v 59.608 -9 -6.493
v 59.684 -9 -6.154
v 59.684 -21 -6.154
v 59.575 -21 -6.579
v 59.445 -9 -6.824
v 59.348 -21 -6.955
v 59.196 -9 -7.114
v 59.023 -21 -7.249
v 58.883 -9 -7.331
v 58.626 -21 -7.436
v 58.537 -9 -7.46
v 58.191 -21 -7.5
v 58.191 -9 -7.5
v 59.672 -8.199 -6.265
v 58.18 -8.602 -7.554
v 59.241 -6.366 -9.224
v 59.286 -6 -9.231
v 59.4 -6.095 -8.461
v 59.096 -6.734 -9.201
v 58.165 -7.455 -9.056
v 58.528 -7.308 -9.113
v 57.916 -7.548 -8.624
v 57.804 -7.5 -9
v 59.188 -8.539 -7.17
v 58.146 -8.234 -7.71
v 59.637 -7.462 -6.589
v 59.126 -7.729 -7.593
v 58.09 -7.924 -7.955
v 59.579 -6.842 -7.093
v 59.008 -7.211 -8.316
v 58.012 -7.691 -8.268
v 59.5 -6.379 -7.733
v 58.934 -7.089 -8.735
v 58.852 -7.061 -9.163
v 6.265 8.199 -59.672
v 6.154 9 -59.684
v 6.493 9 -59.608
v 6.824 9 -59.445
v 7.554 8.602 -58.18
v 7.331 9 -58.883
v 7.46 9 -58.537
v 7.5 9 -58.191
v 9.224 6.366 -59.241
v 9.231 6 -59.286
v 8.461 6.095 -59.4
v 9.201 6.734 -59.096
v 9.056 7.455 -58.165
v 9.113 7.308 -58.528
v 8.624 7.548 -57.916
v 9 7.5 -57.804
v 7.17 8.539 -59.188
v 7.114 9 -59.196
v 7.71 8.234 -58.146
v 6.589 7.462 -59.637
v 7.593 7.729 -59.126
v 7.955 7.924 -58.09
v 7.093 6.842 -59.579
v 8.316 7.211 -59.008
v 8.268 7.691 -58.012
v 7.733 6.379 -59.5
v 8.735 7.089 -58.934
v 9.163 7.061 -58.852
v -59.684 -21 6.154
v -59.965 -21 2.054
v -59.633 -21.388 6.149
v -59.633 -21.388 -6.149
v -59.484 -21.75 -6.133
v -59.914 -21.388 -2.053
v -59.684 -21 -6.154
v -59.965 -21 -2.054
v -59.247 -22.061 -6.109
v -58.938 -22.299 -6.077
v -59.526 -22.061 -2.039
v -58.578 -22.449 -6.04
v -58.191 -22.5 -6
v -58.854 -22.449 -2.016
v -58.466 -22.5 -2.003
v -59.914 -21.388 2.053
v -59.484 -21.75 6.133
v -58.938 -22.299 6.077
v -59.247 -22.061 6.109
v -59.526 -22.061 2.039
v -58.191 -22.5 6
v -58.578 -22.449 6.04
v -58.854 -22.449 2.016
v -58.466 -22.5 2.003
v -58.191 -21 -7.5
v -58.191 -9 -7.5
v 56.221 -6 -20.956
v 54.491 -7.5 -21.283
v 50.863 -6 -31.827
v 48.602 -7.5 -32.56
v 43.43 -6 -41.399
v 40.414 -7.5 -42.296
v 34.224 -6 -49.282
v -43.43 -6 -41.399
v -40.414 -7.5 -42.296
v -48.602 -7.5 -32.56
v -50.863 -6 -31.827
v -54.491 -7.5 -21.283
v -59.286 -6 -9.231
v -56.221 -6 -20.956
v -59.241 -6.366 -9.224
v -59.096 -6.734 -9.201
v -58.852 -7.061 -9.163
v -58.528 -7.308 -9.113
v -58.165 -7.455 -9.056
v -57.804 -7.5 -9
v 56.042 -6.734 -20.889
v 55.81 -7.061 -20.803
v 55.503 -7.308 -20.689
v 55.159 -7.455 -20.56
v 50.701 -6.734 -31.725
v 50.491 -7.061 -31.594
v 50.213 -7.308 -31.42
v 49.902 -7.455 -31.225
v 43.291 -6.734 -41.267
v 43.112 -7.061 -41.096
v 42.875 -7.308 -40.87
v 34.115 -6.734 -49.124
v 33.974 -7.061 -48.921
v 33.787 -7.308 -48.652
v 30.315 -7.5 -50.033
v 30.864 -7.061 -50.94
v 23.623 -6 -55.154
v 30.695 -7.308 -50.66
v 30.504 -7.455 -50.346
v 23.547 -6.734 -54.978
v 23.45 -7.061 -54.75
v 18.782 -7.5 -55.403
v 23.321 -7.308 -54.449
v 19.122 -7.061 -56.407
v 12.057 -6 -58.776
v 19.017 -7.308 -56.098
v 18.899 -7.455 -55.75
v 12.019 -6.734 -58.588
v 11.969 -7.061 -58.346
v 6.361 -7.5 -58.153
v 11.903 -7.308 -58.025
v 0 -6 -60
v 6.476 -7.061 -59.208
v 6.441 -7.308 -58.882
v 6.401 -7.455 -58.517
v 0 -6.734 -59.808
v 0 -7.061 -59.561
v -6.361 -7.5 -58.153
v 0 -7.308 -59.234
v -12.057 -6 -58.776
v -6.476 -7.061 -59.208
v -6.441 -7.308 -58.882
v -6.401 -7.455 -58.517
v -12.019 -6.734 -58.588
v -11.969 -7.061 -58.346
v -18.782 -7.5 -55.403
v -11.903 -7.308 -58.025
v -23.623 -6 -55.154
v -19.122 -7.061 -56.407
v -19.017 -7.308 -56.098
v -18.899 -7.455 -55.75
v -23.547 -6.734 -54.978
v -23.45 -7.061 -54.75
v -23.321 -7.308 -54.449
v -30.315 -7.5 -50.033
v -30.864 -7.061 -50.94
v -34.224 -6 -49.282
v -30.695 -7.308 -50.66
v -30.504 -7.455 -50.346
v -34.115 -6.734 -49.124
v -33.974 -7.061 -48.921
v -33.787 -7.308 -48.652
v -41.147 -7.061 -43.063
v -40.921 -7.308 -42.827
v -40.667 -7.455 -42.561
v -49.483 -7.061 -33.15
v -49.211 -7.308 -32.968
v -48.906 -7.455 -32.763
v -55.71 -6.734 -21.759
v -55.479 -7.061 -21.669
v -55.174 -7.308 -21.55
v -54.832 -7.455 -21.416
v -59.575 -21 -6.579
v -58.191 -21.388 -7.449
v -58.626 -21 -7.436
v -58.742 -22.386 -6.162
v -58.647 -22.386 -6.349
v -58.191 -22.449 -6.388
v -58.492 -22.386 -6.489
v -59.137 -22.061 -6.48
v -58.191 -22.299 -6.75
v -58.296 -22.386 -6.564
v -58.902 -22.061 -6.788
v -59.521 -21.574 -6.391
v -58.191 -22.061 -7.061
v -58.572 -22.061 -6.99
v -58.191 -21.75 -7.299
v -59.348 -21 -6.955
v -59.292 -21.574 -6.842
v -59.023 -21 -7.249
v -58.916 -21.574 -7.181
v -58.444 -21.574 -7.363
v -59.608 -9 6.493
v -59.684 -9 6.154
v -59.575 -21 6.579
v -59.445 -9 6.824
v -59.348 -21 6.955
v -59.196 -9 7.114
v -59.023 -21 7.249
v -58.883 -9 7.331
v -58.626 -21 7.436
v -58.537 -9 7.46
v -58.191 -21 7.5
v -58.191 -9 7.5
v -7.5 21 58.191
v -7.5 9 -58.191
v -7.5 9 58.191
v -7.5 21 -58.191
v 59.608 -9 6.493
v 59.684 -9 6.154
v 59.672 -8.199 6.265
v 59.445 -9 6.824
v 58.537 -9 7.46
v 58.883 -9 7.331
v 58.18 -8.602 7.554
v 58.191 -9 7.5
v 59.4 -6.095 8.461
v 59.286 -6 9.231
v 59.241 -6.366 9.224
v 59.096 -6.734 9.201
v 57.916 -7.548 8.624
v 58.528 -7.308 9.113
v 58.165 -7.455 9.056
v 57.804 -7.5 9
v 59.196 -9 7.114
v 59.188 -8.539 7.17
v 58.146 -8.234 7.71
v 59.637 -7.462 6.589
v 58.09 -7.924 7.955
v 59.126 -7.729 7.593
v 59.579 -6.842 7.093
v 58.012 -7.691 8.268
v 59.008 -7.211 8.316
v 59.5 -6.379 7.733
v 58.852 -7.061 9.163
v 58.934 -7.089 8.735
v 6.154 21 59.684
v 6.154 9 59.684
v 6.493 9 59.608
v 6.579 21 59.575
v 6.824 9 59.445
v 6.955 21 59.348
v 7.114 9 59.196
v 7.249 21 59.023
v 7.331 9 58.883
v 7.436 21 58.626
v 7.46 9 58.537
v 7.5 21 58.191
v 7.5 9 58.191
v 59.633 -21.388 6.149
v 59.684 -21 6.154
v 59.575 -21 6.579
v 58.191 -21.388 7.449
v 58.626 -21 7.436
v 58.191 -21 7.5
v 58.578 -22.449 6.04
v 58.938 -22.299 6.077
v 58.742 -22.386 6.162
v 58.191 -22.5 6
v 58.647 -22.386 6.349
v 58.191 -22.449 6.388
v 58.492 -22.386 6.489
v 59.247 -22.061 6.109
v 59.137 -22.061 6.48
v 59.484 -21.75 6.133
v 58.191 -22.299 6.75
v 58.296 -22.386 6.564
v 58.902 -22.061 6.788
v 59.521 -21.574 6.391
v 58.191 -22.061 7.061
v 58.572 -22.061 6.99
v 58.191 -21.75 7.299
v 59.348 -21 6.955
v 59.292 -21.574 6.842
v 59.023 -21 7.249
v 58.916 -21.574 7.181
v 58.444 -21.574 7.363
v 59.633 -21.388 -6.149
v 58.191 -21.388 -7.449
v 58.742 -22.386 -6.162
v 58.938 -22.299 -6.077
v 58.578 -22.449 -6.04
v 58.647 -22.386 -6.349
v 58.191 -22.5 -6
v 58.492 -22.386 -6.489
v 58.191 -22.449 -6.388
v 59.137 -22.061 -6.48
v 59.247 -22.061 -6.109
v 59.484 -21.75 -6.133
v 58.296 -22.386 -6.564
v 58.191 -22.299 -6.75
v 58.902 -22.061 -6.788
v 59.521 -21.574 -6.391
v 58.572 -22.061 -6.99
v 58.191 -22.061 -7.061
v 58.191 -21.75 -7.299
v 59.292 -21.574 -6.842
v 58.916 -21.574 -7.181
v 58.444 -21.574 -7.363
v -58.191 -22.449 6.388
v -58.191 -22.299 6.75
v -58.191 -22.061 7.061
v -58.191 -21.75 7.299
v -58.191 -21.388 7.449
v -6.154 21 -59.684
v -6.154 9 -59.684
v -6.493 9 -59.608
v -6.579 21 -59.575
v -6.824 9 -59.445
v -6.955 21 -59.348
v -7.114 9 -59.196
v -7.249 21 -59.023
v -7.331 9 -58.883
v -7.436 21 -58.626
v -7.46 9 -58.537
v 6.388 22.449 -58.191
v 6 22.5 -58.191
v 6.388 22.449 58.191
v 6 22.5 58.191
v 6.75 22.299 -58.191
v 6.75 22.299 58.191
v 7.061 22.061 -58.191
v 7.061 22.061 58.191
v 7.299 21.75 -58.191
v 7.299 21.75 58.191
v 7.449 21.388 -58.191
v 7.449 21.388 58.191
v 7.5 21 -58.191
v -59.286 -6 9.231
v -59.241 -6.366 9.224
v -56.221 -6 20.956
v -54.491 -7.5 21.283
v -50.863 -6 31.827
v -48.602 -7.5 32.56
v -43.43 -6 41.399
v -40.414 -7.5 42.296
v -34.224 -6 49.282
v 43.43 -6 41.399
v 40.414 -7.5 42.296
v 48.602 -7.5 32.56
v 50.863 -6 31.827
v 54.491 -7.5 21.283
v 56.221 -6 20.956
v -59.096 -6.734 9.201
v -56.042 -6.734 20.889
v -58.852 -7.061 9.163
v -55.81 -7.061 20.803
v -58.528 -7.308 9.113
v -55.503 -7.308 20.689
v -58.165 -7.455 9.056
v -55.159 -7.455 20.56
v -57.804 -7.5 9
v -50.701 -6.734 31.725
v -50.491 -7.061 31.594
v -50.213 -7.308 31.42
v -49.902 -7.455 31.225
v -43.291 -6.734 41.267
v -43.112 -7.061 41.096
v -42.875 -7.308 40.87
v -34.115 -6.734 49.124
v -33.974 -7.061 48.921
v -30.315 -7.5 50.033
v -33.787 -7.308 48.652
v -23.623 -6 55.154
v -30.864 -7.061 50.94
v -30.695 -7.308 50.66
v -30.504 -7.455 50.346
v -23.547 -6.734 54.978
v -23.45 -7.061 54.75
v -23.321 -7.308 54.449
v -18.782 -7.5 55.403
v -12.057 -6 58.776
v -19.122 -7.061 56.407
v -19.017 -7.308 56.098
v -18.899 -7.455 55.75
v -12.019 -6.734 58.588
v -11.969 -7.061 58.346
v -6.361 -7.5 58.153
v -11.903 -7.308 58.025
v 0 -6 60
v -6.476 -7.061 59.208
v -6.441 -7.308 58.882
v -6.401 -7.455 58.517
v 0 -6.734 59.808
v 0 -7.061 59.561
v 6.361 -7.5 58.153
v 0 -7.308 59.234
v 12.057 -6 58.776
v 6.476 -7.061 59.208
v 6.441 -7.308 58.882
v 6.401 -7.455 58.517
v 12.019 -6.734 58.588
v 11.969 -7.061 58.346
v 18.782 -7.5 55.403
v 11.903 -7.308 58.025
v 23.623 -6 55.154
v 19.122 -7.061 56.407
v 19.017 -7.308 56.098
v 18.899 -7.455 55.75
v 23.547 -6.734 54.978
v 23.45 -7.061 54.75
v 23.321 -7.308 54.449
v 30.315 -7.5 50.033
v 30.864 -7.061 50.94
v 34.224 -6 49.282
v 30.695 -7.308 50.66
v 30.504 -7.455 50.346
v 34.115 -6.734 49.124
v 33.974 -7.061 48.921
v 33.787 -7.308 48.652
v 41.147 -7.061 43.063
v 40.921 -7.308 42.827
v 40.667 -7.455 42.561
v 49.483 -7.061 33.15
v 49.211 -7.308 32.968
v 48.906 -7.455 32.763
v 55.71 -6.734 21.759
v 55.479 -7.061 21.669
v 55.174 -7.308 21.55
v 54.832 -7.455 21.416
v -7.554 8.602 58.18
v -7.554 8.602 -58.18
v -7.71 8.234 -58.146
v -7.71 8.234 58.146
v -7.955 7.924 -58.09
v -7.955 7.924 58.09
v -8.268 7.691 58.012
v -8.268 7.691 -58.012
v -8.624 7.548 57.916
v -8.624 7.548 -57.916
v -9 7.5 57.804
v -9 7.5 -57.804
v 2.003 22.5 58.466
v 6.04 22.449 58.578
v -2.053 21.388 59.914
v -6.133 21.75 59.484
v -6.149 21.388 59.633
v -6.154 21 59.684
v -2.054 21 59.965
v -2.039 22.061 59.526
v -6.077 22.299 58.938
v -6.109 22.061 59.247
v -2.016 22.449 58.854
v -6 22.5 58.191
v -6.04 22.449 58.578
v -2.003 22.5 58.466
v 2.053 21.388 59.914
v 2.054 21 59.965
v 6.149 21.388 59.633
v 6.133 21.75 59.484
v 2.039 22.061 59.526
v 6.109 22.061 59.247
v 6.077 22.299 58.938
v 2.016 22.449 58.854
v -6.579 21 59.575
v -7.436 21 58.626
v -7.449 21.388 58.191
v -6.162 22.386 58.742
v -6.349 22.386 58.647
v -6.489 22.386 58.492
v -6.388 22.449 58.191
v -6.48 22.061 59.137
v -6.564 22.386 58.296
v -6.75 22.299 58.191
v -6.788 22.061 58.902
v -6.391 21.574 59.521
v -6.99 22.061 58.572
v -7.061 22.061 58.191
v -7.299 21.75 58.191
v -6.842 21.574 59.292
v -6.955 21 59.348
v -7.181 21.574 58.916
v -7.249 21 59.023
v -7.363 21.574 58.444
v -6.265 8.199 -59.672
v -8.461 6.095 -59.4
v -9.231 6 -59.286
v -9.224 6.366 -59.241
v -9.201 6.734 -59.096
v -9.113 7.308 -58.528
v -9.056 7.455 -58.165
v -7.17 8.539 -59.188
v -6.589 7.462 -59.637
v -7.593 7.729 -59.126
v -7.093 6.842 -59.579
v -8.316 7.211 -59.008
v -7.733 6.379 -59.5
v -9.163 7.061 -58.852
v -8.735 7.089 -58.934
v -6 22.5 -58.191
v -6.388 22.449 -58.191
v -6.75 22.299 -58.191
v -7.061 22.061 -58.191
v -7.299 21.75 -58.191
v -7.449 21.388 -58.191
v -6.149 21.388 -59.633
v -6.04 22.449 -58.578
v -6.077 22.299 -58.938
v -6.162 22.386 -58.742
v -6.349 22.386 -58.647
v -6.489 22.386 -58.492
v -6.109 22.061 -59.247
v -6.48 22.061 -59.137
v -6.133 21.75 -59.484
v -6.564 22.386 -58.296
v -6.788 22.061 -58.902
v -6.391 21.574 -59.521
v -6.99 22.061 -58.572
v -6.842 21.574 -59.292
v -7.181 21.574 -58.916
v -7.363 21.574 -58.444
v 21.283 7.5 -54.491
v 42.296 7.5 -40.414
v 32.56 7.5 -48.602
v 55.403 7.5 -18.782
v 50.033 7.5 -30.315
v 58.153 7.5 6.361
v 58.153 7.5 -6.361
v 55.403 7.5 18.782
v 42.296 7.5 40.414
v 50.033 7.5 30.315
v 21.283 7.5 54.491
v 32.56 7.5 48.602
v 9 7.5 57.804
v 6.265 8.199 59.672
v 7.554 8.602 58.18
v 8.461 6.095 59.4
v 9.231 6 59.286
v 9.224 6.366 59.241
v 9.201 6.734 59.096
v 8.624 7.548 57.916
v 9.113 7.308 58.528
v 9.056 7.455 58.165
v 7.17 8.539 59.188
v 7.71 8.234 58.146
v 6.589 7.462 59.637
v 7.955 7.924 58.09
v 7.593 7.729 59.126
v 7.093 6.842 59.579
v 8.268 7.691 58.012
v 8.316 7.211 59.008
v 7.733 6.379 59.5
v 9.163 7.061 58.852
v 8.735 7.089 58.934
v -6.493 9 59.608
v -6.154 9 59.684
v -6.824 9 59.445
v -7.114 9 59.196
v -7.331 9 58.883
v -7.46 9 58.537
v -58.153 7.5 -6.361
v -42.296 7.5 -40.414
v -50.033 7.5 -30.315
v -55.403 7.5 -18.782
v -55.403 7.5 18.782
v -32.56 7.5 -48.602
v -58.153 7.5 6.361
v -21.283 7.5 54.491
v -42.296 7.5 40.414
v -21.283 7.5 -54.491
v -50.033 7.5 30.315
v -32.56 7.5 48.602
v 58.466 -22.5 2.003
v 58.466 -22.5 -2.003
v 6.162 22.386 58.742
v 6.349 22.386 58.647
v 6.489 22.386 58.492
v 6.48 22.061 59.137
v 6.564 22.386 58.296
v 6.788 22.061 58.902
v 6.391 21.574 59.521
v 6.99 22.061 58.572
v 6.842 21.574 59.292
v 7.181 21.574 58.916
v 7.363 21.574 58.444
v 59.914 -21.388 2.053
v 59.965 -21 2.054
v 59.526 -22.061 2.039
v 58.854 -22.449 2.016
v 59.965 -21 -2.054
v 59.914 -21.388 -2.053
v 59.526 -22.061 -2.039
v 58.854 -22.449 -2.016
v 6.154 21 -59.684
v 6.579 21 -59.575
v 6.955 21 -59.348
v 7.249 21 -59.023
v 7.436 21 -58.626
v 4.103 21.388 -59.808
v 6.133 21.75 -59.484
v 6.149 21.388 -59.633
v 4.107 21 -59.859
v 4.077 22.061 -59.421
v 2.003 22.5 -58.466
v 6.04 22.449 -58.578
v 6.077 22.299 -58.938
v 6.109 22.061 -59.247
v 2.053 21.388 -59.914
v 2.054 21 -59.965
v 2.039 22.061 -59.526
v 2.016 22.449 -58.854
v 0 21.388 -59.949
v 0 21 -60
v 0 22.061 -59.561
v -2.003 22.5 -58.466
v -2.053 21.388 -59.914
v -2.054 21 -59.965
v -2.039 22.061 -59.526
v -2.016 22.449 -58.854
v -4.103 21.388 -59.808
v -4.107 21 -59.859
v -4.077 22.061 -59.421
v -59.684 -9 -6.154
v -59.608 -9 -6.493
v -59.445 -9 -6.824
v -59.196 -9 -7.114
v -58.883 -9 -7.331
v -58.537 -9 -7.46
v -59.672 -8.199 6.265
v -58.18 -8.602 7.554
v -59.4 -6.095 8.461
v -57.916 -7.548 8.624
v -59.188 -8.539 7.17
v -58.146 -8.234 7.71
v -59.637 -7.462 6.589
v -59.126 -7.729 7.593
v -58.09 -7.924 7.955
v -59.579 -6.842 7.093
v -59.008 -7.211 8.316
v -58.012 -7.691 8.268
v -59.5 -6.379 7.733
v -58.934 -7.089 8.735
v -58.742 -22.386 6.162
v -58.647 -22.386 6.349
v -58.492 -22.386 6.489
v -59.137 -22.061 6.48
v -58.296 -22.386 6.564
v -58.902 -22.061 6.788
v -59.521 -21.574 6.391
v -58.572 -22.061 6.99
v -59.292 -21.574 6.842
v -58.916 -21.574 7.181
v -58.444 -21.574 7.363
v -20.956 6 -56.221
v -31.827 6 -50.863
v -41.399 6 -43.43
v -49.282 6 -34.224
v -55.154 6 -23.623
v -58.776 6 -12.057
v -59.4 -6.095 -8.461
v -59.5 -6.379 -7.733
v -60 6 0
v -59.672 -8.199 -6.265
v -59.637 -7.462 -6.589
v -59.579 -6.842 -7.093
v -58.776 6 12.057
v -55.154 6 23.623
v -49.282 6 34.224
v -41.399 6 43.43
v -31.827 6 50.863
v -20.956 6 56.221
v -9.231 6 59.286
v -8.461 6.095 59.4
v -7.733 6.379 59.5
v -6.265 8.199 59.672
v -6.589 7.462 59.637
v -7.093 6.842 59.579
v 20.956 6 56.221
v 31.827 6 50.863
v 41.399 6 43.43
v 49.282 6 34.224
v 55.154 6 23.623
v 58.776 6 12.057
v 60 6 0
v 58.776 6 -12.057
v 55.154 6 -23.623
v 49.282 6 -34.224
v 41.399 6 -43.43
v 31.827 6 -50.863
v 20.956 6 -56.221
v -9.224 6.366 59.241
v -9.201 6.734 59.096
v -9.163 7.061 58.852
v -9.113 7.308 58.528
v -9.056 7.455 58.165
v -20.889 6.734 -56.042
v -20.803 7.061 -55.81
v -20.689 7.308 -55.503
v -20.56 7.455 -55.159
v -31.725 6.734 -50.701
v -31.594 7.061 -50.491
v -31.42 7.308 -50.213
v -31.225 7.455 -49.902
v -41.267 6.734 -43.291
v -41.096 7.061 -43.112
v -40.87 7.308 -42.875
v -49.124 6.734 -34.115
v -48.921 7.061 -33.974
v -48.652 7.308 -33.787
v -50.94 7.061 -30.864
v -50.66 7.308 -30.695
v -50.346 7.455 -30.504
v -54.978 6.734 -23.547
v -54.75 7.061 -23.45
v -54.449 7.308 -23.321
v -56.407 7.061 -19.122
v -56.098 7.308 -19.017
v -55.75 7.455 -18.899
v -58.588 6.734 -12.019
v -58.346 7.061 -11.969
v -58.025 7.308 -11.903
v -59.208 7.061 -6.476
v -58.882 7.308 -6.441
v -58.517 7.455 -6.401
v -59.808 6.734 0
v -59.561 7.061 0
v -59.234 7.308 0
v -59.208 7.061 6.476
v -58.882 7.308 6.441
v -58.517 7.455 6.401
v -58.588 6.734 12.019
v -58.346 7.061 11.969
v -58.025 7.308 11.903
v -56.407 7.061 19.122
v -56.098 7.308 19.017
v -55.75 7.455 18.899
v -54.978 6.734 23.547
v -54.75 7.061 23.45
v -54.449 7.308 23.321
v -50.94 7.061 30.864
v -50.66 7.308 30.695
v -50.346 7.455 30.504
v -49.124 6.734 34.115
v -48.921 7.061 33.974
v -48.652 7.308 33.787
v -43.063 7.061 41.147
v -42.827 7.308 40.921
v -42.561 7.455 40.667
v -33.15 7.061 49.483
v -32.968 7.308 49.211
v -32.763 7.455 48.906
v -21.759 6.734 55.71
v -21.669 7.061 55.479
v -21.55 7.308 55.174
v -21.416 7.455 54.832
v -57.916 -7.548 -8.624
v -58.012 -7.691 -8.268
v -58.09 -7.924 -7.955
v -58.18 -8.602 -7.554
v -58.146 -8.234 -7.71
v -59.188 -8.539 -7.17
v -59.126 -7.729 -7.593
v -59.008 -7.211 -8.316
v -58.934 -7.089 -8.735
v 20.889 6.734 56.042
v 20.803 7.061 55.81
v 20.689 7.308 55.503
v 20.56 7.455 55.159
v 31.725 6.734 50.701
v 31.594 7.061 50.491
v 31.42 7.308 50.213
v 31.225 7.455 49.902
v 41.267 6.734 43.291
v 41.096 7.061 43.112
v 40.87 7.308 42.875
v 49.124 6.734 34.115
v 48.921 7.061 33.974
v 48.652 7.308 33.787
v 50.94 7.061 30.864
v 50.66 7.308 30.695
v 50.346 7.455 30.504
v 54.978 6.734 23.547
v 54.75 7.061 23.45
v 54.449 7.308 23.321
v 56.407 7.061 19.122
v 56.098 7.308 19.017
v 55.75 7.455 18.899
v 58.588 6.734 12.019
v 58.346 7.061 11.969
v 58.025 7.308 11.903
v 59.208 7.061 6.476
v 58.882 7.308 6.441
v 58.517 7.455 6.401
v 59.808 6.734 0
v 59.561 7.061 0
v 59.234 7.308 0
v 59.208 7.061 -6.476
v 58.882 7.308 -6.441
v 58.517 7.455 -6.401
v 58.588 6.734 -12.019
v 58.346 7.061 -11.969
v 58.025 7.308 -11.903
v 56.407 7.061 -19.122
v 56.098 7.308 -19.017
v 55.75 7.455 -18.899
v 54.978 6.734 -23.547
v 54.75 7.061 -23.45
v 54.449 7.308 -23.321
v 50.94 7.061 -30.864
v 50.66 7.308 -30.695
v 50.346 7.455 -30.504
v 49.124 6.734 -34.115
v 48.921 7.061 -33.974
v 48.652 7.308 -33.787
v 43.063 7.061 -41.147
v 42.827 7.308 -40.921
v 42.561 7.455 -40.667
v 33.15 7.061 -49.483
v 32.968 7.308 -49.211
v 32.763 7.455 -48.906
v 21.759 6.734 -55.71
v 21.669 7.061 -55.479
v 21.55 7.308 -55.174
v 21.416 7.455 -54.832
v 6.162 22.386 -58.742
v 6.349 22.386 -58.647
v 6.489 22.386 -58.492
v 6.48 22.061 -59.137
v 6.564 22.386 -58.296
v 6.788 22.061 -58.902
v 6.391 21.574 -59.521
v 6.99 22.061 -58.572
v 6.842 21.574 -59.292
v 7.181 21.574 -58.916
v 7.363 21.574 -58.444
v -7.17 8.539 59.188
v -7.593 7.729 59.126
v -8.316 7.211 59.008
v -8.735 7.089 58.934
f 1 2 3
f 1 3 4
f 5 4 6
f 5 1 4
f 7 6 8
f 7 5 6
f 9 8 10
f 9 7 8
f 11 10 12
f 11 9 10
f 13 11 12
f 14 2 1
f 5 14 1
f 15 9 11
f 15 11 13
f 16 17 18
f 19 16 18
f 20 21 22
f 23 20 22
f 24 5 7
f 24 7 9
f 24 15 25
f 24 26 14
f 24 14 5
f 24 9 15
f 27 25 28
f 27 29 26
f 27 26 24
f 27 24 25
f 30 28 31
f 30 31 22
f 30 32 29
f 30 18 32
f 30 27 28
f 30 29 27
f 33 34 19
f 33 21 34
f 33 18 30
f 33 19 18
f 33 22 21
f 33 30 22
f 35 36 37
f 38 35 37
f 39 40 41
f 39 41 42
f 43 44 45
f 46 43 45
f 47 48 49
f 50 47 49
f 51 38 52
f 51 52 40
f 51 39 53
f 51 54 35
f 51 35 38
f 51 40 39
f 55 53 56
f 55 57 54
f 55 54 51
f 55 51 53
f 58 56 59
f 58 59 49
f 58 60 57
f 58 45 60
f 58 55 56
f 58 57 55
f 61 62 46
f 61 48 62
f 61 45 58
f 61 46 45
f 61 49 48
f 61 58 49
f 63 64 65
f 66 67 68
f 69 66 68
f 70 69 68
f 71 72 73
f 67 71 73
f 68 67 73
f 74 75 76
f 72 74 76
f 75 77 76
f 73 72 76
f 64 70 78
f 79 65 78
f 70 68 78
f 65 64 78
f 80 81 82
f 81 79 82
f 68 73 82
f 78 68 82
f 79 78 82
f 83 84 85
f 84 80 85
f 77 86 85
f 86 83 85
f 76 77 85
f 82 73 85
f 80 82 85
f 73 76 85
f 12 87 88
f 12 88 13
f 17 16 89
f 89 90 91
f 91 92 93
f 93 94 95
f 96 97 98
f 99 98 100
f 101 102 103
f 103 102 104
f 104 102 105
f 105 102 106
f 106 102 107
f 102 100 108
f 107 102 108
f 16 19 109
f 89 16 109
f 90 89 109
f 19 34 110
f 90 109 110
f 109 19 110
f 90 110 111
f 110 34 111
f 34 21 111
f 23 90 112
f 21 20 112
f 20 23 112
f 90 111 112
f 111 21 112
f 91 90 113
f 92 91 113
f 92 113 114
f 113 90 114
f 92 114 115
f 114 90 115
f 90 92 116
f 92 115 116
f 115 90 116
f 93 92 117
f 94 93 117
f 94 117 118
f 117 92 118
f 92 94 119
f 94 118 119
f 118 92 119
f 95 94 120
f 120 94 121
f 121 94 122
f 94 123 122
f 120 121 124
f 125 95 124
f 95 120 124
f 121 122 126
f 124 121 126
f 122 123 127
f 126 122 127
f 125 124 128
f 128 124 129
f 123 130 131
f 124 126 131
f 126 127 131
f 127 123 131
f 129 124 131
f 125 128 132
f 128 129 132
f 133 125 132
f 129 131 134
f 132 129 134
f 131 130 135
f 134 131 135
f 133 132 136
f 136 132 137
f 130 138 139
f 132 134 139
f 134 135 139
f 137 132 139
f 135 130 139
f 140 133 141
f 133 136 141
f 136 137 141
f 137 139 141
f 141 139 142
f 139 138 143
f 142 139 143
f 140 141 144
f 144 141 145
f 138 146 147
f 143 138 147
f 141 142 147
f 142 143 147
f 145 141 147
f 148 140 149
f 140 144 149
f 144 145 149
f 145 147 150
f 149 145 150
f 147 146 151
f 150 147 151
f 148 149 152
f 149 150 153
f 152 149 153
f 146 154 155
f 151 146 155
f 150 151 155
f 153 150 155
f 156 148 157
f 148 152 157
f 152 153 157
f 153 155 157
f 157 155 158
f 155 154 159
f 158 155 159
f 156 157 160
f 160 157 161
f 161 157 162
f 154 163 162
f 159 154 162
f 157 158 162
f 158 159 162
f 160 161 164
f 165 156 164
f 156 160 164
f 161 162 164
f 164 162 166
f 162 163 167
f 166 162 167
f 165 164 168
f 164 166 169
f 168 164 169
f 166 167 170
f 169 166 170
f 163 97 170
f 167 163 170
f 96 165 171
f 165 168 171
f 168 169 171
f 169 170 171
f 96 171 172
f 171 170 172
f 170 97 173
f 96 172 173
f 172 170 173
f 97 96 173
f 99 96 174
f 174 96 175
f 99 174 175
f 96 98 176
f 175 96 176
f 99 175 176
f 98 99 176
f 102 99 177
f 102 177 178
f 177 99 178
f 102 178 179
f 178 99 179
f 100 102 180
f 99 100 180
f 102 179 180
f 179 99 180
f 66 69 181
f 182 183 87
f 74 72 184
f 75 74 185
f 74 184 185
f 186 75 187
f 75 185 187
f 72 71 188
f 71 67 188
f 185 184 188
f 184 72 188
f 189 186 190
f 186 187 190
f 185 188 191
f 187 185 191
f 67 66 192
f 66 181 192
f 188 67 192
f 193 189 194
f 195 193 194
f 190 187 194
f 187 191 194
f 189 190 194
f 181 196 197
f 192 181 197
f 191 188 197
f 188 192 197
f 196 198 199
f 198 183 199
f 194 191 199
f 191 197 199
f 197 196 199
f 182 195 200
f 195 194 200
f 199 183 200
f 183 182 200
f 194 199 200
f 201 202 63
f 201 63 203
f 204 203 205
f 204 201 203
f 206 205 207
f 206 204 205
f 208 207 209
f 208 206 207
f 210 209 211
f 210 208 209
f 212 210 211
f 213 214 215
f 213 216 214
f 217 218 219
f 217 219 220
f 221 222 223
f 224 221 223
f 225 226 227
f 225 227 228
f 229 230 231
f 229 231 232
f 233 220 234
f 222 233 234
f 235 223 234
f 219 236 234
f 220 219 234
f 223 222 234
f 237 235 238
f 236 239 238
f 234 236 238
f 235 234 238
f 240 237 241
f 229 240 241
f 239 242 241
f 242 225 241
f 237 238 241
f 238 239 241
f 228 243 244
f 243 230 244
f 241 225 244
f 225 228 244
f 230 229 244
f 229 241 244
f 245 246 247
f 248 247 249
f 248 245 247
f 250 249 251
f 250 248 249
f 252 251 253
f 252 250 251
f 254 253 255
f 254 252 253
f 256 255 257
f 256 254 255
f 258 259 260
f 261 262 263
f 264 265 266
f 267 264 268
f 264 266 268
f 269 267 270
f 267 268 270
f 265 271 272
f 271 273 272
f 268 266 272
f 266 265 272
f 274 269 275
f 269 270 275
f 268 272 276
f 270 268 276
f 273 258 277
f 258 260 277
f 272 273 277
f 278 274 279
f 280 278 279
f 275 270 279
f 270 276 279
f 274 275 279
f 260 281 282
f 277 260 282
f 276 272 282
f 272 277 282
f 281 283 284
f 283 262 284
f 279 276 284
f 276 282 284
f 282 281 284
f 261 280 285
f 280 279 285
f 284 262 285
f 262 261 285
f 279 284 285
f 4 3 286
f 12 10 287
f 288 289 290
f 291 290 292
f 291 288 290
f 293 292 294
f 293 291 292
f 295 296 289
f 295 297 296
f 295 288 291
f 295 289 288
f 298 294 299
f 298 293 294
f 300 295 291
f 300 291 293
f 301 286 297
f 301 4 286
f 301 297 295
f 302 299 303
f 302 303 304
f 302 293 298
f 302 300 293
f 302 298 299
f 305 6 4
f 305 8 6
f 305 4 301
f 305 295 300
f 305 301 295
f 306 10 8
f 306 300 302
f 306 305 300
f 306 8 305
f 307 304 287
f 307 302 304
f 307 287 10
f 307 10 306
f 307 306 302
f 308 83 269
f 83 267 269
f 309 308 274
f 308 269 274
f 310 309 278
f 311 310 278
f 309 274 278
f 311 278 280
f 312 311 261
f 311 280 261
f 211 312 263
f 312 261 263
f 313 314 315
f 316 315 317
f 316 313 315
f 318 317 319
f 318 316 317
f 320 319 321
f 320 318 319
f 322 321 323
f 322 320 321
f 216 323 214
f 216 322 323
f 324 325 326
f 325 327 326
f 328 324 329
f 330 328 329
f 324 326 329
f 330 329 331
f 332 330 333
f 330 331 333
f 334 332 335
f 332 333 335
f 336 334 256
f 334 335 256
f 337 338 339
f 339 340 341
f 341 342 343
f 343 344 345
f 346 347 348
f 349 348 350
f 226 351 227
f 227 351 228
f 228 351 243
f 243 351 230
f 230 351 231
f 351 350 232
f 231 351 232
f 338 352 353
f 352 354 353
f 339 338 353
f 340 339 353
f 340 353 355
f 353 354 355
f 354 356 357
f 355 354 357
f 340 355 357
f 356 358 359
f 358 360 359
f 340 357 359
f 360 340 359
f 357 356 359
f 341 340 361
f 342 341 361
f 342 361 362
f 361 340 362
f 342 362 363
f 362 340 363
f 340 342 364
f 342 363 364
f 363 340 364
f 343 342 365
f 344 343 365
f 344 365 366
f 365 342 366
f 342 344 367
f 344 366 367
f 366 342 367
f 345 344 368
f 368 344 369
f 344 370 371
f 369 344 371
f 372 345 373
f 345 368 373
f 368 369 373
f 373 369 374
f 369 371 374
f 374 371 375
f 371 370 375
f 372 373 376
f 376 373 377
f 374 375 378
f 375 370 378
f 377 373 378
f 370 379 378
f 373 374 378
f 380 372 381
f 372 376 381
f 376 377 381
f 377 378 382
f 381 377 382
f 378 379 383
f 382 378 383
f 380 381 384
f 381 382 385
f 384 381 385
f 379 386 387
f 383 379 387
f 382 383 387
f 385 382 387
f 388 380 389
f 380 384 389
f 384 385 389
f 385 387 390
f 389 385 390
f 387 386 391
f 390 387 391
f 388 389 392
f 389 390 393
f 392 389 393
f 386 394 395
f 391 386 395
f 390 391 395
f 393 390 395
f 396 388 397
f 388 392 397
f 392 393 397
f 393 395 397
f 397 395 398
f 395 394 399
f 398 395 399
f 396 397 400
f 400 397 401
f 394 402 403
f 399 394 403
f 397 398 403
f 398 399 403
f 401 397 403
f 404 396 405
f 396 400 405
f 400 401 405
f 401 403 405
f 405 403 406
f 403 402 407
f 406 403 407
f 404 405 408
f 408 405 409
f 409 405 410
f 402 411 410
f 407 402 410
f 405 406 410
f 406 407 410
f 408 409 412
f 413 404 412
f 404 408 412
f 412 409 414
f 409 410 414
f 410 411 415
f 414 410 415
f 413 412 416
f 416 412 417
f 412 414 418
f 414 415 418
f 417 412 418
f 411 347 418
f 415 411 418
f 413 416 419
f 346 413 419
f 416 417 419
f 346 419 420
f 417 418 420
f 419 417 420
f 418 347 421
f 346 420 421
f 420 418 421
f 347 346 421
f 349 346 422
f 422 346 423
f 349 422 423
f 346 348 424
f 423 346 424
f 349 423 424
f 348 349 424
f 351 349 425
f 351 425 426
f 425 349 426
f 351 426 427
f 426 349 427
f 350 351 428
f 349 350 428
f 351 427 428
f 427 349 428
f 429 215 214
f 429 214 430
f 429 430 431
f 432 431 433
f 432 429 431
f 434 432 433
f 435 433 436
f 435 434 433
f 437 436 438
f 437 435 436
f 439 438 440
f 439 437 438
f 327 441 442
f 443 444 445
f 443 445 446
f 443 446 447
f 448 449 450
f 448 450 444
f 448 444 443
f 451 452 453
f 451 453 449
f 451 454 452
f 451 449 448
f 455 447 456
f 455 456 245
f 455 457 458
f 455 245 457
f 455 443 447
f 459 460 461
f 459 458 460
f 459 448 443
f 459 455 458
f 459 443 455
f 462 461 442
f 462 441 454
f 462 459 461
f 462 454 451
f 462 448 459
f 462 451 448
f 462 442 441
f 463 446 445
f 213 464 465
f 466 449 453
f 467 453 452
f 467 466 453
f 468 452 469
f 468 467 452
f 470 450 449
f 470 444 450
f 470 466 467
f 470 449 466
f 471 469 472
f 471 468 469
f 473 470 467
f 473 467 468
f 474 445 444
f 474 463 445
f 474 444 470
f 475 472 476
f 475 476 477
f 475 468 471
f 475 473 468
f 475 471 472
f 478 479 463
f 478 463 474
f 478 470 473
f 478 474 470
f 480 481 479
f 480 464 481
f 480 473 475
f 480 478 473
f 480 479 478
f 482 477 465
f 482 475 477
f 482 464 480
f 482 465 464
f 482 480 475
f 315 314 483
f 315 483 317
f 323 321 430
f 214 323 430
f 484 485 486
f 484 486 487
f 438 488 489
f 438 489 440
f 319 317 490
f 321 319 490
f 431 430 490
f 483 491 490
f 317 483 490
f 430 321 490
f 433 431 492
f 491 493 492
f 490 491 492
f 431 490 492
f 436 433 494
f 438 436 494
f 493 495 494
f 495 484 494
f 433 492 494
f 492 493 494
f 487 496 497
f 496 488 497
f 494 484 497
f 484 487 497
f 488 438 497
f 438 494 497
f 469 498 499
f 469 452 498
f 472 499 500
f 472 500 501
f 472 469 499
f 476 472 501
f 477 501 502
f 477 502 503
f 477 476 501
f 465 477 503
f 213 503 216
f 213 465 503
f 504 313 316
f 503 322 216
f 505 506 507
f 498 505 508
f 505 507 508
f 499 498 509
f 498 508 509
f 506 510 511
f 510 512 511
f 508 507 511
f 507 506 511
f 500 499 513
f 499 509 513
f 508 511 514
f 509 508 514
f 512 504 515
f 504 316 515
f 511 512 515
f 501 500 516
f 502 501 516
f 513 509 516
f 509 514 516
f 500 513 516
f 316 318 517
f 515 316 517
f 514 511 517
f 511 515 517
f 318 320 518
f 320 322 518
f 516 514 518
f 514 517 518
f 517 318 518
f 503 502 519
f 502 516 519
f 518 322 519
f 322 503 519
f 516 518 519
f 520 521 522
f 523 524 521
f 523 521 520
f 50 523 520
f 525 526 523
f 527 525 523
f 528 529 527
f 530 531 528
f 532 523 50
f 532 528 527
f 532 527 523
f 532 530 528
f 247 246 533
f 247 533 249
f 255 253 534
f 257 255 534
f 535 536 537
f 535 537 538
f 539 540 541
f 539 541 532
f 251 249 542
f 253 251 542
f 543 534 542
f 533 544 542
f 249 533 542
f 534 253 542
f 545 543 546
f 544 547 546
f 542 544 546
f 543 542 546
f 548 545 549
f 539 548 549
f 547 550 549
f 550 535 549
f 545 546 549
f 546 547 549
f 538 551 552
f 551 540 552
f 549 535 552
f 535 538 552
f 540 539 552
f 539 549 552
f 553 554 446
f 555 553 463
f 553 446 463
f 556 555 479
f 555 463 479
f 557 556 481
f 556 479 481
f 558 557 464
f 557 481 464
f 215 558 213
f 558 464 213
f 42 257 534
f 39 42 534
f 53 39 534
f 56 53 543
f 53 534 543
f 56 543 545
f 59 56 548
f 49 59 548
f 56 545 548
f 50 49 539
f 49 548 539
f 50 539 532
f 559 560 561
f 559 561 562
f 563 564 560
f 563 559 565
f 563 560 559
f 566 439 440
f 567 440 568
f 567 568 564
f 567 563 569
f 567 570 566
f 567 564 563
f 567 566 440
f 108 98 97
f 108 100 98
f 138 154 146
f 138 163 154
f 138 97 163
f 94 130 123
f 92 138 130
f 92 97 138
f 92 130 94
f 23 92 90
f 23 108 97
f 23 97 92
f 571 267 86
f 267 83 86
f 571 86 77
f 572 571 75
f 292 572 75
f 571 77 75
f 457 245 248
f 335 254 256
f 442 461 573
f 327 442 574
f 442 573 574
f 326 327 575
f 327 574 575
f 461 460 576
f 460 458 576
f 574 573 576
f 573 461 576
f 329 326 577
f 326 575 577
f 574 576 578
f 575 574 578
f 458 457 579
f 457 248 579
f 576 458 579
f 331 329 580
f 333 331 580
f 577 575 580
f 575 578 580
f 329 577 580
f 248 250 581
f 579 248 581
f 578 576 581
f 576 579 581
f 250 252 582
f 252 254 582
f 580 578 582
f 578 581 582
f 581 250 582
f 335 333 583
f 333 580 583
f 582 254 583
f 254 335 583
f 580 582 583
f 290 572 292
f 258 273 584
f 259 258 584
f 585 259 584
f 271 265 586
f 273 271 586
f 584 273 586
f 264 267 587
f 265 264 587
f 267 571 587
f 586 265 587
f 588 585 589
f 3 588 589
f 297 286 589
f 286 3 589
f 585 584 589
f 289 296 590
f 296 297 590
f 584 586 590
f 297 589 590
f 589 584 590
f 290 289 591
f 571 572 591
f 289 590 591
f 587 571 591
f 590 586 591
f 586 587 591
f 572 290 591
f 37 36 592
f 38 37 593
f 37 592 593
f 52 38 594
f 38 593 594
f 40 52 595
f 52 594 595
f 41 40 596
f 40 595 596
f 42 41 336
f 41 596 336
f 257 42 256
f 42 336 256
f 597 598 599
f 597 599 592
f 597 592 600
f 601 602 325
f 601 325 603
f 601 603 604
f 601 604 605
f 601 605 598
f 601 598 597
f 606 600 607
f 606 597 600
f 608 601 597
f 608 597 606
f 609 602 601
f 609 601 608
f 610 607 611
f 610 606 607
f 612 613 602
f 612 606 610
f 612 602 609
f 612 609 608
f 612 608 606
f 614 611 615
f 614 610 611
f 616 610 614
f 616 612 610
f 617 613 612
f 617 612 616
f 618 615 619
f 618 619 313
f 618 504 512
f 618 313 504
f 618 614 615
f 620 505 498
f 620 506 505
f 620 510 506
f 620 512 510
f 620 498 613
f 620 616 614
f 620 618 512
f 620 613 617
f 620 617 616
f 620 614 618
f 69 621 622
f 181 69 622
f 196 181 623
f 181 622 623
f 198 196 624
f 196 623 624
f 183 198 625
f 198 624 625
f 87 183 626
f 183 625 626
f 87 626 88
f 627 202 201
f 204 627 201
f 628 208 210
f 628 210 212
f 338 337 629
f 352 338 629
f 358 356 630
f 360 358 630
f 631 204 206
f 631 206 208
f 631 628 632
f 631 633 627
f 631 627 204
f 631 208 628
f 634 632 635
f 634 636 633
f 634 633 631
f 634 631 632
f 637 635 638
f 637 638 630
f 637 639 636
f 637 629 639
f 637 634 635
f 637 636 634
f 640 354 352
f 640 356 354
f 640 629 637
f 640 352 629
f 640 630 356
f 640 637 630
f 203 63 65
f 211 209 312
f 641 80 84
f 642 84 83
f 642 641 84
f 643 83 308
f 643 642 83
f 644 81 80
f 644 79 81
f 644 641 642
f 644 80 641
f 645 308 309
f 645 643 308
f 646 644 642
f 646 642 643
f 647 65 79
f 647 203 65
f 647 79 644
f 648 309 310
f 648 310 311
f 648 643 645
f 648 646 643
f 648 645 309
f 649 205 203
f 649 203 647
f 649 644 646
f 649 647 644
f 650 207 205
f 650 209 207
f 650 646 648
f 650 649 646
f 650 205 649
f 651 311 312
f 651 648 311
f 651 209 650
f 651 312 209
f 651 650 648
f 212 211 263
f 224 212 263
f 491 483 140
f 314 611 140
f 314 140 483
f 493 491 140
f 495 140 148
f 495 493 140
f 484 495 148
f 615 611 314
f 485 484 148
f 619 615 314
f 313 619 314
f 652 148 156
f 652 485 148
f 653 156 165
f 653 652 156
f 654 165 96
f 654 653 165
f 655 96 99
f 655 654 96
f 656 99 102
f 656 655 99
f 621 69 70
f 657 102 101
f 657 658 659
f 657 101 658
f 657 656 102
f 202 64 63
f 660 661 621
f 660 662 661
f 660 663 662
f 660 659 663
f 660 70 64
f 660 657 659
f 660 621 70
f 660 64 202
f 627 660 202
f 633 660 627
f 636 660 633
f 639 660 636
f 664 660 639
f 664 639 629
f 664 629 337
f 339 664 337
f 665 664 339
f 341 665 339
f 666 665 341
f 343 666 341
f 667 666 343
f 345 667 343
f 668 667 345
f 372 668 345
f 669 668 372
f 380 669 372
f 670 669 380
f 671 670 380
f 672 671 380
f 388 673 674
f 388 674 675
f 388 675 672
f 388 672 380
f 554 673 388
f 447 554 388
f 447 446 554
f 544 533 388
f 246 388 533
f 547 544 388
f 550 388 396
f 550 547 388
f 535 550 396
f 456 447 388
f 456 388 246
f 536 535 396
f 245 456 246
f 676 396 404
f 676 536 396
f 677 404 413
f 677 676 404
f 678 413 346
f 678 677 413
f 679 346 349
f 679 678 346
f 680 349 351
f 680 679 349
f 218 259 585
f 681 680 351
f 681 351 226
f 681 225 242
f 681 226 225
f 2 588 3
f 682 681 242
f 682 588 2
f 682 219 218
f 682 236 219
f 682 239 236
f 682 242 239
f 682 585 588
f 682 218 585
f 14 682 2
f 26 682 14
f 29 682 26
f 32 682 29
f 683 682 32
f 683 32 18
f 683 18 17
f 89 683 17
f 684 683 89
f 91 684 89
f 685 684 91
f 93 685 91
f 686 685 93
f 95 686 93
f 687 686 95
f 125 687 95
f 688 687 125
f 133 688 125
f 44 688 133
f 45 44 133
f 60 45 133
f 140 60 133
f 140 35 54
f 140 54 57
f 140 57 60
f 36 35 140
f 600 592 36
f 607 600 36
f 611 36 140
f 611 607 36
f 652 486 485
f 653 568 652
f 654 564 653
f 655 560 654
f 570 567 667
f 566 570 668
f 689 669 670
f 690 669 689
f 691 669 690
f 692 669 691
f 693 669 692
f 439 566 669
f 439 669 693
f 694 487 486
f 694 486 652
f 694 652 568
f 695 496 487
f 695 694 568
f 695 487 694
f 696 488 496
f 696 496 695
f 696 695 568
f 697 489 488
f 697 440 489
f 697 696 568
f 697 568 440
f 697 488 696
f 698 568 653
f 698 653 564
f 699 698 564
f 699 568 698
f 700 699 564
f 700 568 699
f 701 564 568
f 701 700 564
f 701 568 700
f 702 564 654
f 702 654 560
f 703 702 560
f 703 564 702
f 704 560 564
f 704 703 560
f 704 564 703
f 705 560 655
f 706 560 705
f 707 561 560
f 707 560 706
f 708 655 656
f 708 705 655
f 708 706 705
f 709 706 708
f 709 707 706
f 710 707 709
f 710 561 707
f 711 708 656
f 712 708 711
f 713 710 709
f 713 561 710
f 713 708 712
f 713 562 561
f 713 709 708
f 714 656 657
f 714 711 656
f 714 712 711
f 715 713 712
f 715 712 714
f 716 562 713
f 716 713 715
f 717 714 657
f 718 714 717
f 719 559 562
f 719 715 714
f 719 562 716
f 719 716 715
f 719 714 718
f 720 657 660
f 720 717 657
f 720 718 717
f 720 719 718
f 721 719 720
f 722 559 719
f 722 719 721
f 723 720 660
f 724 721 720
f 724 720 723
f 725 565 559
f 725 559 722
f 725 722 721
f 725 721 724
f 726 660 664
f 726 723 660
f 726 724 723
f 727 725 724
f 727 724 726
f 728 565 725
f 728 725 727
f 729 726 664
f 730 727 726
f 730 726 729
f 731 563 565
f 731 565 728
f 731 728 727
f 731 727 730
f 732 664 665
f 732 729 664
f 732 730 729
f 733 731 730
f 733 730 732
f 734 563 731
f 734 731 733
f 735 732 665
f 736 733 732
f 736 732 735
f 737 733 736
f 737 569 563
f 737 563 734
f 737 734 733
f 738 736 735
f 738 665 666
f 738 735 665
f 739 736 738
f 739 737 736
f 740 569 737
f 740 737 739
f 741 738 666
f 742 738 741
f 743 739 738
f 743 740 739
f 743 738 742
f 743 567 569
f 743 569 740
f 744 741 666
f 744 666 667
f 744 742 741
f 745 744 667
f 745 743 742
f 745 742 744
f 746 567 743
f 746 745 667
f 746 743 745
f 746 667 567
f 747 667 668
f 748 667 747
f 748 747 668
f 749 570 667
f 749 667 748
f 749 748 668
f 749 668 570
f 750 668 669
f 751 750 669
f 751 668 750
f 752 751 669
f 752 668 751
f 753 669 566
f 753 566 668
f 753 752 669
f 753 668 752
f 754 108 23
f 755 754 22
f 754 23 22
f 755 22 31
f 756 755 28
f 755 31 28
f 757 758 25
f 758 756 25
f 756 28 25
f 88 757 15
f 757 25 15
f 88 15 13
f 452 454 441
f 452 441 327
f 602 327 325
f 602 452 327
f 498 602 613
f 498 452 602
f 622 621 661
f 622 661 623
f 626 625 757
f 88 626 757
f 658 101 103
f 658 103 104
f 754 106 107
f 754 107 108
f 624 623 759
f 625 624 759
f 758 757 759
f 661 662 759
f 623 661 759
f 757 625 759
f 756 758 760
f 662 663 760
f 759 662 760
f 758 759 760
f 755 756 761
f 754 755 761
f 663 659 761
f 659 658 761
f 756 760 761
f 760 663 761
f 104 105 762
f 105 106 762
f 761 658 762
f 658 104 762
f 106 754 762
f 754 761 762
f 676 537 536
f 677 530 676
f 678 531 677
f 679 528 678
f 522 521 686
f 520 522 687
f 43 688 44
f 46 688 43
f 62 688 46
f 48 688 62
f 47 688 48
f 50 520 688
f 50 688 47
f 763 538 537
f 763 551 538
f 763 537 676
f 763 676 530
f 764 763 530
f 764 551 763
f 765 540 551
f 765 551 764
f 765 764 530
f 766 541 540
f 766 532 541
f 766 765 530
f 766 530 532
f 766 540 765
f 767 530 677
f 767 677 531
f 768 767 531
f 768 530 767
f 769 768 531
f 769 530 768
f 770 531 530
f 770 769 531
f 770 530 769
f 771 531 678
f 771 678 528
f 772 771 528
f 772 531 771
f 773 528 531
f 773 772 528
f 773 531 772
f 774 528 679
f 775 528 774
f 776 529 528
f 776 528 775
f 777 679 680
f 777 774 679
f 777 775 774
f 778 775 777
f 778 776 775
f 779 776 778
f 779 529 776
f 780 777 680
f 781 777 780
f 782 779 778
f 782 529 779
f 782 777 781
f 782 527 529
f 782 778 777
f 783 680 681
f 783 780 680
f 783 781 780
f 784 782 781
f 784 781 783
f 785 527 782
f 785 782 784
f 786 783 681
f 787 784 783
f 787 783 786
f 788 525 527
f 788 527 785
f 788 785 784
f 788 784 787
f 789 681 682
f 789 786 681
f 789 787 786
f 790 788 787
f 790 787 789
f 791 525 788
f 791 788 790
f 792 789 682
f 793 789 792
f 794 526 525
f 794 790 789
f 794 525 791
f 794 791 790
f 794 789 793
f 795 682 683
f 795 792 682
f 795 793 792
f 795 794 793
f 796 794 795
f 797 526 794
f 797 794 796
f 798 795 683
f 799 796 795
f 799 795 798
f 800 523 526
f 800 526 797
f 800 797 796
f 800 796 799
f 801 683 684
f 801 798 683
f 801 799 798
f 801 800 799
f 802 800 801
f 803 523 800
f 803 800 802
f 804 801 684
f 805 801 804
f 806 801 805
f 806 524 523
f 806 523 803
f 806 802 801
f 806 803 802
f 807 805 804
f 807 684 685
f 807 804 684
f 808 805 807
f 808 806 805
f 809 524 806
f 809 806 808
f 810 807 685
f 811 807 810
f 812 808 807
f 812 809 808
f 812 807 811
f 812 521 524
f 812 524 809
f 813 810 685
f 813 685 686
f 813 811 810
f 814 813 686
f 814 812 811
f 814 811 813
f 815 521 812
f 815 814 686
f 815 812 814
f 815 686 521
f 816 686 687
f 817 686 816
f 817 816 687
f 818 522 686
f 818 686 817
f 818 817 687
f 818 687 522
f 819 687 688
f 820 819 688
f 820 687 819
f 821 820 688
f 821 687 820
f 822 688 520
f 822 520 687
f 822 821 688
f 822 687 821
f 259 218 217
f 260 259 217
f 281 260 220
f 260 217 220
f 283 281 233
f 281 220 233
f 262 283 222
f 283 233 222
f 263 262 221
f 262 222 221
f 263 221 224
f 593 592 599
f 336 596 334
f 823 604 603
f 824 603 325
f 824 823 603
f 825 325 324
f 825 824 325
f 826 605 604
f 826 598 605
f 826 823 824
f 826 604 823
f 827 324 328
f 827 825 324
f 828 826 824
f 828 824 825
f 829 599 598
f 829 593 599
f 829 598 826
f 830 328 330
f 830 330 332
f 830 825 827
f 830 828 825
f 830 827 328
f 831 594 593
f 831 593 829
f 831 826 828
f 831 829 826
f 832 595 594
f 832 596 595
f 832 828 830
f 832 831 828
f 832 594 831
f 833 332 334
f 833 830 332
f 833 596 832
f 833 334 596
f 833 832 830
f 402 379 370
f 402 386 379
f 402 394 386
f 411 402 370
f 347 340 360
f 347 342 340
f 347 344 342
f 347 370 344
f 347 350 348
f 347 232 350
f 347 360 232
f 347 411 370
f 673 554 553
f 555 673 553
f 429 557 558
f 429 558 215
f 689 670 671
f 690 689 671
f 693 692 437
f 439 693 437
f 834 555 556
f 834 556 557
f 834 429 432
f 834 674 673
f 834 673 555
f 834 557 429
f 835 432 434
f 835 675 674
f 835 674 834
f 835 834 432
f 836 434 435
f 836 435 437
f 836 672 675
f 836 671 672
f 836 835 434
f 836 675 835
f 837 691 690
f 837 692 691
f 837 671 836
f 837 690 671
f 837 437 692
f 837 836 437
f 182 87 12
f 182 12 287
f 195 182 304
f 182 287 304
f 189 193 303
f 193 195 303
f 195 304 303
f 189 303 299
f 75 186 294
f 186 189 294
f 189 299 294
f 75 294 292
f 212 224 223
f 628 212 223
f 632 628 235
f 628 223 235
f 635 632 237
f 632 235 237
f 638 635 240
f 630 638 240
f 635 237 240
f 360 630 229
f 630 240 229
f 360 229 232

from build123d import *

# Parameters (mm, degrees)
SKETCH2_R           = 60
BOSS_EXTRUDE1_DEPTH = 22.5
SKETCH3_OUTSIDE_W   = 157.114
SKETCH3_OUTSIDE_H   = 157.114
SKETCH3_OUTSIDE_W_2 = 15
SKETCH3_OUTSIDE_H_2 = 130
CUT_EXTRUDE1_DEPTH  = 15
SKETCH4_OUTSIDE_W   = 157.114
SKETCH4_OUTSIDE_H   = 157.114
SKETCH4_OUTSIDE_W_2 = 130
SKETCH4_OUTSIDE_H_2 = 15
CUT_EXTRUDE2_DEPTH  = 15
FILLET1_R           = 1.5


with BuildPart() as part:
    # Sketch2 → Boss-Extrude1 (new, symmetric)
    with BuildSketch(Plane(origin=(0, 0, 0), x_dir=(-1, 0, 0), z_dir=(0, 1, 0))):
        with Locations(Location((0, 0, 0), (0, 0, 270))):
            Circle(SKETCH2_R)
    extrude(amount=BOSS_EXTRUDE1_DEPTH, both=True)

    # Sketch3 outside → Cut-Extrude1 (cut)
    with BuildSketch(Plane(origin=(0, 22.5, 0), x_dir=(-1, 0, 0), z_dir=(0, 1, 0))):
        Rectangle(SKETCH3_OUTSIDE_W, SKETCH3_OUTSIDE_H)
        Rectangle(SKETCH3_OUTSIDE_W_2, SKETCH3_OUTSIDE_H_2, mode=Mode.SUBTRACT)
    extrude(amount=-CUT_EXTRUDE1_DEPTH, mode=Mode.SUBTRACT)

    # Sketch4 outside → Cut-Extrude2 (cut)
    with BuildSketch(Plane.XZ.offset(22.5)):
        Rectangle(SKETCH4_OUTSIDE_W, SKETCH4_OUTSIDE_H)
        Rectangle(SKETCH4_OUTSIDE_W_2, SKETCH4_OUTSIDE_H_2, mode=Mode.SUBTRACT)
    extrude(amount=-CUT_EXTRUDE2_DEPTH, mode=Mode.SUBTRACT)

    # Fillet1
    fillet1_edges = [part.edges().sort_by_distance(p)[0] for p in [
        (7.5, 7.5, 0),
        (-7.5, 7.5, 0),
        (-7.5, 15, -59.529404499),
        (7.5, 15, 59.529404499),
        (-7.5, 15, 59.529404499),
        (7.5, 15, -59.529404499),
        (60, -22.5, 0),
        (-60, -22.5, 0),
        (0, -22.5, 7.5),
        (0, -22.5, -7.5),
        (0, -7.5, 60),
        (-39.686269666, -7.5, -45),
        (0, -7.5, 7.5),
        (0, -7.5, -7.5),
        (59.529404499, -15, -7.5),
        (-59.529404499, -15, 7.5),
        (-59.529404499, -15, -7.5),
        (59.529404499, -15, 7.5),
        (-3.757374753, 22.5, -59.882235554),
        (0, 22.5, 60),
        (7.5, 22.5, 0),
        (-7.5, 22.5, 0),
        (60, 7.5, 0),
        (-60, 7.5, 0),
    ]]
    fillet(fillet1_edges, radius=FILLET1_R)


solid = part.part
